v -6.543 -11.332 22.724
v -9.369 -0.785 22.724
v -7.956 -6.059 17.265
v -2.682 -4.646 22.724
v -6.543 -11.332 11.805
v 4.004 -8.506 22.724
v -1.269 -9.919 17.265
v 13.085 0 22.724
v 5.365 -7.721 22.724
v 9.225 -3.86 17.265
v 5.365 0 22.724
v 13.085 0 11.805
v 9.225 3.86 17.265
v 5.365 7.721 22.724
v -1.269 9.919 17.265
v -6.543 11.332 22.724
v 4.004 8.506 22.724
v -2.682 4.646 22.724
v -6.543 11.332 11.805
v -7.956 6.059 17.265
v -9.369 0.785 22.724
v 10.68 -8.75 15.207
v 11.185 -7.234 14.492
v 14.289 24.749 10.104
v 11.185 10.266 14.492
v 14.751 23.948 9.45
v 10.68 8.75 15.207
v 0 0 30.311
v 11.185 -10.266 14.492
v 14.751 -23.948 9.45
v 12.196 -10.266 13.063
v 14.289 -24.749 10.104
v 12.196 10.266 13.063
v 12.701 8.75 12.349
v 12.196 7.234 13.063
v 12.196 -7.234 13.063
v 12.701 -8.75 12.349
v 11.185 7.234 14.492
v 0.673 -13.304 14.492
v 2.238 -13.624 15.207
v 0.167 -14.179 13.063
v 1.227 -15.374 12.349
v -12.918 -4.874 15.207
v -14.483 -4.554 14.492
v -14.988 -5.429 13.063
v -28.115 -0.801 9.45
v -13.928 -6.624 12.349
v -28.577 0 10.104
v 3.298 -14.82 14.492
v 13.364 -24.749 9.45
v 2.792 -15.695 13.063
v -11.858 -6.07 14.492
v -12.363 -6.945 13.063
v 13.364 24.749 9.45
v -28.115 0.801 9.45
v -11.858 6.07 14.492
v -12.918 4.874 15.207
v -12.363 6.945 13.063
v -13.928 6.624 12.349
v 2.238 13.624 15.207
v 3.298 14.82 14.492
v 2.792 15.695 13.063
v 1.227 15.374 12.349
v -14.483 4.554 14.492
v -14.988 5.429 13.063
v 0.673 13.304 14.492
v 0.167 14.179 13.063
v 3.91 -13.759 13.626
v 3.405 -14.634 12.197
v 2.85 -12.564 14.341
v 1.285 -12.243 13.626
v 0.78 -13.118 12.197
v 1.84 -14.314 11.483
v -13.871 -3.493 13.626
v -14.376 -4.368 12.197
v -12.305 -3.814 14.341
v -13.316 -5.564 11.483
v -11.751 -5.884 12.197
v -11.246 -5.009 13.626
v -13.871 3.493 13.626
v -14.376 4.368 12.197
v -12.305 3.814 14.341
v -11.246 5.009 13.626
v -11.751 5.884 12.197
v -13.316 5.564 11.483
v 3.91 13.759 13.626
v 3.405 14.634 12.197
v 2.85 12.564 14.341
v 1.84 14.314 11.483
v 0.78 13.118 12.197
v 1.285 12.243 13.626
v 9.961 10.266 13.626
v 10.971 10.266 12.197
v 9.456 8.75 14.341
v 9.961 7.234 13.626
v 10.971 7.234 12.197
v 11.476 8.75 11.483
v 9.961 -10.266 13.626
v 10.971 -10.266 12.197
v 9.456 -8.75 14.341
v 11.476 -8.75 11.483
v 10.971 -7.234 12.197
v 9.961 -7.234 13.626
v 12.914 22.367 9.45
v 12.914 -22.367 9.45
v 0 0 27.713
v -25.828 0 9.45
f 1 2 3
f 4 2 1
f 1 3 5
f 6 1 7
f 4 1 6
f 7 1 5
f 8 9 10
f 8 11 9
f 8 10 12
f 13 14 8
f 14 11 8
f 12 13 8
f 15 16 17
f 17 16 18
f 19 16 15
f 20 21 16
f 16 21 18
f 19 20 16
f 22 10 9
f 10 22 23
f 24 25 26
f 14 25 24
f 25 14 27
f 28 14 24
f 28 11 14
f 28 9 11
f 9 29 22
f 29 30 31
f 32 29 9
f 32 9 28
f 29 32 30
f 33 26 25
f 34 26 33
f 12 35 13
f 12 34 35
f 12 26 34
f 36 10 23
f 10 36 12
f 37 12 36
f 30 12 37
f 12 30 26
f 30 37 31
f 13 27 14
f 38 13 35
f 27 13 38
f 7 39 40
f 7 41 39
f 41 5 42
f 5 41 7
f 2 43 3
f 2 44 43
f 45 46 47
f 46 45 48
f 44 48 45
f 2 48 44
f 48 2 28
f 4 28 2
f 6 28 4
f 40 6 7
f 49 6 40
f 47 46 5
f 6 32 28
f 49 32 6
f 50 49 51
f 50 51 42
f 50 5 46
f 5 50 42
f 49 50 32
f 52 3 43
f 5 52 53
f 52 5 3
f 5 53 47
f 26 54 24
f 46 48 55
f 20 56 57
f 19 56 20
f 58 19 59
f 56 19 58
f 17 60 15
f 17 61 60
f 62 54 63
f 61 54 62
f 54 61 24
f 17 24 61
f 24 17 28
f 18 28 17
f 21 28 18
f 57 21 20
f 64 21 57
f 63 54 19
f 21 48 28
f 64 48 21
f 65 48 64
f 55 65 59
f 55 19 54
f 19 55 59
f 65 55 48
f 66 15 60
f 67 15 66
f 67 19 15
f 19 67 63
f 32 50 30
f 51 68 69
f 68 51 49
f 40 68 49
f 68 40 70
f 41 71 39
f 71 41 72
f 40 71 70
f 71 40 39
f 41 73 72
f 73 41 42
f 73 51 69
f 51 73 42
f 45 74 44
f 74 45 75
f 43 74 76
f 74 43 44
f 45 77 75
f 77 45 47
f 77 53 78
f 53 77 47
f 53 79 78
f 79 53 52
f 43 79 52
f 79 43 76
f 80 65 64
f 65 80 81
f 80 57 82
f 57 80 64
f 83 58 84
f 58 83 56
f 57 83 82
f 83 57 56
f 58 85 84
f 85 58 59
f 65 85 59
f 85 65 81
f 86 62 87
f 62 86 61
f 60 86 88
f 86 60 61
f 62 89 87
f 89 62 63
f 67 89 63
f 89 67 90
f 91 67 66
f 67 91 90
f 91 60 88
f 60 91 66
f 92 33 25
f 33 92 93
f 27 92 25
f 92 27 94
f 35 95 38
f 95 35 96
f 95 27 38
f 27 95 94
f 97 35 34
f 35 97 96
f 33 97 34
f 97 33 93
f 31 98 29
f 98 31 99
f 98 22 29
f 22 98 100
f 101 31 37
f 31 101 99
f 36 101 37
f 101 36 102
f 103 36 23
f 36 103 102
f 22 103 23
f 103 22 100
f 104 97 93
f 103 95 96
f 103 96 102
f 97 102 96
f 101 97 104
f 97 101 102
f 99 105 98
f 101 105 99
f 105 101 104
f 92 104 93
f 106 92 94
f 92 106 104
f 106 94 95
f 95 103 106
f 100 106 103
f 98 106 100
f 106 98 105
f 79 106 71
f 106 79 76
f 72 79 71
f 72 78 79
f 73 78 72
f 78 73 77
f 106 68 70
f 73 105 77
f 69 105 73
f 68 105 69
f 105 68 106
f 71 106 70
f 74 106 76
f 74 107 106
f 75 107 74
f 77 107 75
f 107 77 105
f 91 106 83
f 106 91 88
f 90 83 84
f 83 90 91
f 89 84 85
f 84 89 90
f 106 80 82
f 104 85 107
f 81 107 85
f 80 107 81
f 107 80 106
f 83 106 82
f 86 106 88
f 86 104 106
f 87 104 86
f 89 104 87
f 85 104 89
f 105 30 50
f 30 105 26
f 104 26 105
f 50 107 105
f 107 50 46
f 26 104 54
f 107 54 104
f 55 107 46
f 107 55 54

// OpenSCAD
c = 35;
t = 1.5;
s = 3.5;

intersection()
{
rotate( [ 45, -asin( 1 / sqrt( 3 ) ), 0 ] )
difference()
{
	union()
	{
		cube( [ c, c, c ], center = true );
		translate( [ 1, 1, 1 ]*(c/4.5) )
			for ( a = [ 0, 120, 240 ] ) rotate( a, [ 1, 1, 1 ] )
				translate( [ 0, 0, 1 ] * (6.5*c/35) )
					rotate( [ 45, asin( 1 / sqrt( 3 ) ), 0 ] )
						rotate( 45+180, [ -1, 1, 1 ] )
							cube( 11*c/35, center = true );
	}

		rotate( [ 0, 0, 0 ] )
			translate( [ 0, 0, 1 ] * c/2 ) rotate( [ 0, 0, 45 ] )
				translate( [ 1,0, 0 ] * 4.5*c/35 )
					for ( a = [ -1, +1 ] ) translate( (a+0.0)*[0,1,0] * c/2*0.5 )
					cylinder( r = s/2, h = c, center = true );
		rotate( [ 270, 0, 0 ] )
			translate( [ 0, 0, 1 ] * c/2 ) rotate( [ 0, 0, 270+45 ] )
				translate( [ 1,0, 0 ] * 4.5*c/35 )
					for ( a = [ -1, +1 ] ) translate( (a+0.0)*[0,1,0] * c/2*0.5 )				cylinder( r = s/2, h = c, center = true );
		rotate( [ 0, 90, 0 ] )
			translate( [ 0, 0, 1 ] * c/2 ) rotate( [ 0, 0, 90+45 ] )
				translate( [ 1,0, 0 ] * 4.5*c/35 )
					for ( a = [ -1, +1 ] ) translate( (a+0.0)*[0,1,0] * c/2*0.5 )					cylinder( r = s/2, h = c, center = true );

	cube( [ c-t*2, c-t*2, c-t*2 ], center = true );
}
translate( [ 0, 0, c*0.27+100 ] ) cube( 200, center = true );
}
